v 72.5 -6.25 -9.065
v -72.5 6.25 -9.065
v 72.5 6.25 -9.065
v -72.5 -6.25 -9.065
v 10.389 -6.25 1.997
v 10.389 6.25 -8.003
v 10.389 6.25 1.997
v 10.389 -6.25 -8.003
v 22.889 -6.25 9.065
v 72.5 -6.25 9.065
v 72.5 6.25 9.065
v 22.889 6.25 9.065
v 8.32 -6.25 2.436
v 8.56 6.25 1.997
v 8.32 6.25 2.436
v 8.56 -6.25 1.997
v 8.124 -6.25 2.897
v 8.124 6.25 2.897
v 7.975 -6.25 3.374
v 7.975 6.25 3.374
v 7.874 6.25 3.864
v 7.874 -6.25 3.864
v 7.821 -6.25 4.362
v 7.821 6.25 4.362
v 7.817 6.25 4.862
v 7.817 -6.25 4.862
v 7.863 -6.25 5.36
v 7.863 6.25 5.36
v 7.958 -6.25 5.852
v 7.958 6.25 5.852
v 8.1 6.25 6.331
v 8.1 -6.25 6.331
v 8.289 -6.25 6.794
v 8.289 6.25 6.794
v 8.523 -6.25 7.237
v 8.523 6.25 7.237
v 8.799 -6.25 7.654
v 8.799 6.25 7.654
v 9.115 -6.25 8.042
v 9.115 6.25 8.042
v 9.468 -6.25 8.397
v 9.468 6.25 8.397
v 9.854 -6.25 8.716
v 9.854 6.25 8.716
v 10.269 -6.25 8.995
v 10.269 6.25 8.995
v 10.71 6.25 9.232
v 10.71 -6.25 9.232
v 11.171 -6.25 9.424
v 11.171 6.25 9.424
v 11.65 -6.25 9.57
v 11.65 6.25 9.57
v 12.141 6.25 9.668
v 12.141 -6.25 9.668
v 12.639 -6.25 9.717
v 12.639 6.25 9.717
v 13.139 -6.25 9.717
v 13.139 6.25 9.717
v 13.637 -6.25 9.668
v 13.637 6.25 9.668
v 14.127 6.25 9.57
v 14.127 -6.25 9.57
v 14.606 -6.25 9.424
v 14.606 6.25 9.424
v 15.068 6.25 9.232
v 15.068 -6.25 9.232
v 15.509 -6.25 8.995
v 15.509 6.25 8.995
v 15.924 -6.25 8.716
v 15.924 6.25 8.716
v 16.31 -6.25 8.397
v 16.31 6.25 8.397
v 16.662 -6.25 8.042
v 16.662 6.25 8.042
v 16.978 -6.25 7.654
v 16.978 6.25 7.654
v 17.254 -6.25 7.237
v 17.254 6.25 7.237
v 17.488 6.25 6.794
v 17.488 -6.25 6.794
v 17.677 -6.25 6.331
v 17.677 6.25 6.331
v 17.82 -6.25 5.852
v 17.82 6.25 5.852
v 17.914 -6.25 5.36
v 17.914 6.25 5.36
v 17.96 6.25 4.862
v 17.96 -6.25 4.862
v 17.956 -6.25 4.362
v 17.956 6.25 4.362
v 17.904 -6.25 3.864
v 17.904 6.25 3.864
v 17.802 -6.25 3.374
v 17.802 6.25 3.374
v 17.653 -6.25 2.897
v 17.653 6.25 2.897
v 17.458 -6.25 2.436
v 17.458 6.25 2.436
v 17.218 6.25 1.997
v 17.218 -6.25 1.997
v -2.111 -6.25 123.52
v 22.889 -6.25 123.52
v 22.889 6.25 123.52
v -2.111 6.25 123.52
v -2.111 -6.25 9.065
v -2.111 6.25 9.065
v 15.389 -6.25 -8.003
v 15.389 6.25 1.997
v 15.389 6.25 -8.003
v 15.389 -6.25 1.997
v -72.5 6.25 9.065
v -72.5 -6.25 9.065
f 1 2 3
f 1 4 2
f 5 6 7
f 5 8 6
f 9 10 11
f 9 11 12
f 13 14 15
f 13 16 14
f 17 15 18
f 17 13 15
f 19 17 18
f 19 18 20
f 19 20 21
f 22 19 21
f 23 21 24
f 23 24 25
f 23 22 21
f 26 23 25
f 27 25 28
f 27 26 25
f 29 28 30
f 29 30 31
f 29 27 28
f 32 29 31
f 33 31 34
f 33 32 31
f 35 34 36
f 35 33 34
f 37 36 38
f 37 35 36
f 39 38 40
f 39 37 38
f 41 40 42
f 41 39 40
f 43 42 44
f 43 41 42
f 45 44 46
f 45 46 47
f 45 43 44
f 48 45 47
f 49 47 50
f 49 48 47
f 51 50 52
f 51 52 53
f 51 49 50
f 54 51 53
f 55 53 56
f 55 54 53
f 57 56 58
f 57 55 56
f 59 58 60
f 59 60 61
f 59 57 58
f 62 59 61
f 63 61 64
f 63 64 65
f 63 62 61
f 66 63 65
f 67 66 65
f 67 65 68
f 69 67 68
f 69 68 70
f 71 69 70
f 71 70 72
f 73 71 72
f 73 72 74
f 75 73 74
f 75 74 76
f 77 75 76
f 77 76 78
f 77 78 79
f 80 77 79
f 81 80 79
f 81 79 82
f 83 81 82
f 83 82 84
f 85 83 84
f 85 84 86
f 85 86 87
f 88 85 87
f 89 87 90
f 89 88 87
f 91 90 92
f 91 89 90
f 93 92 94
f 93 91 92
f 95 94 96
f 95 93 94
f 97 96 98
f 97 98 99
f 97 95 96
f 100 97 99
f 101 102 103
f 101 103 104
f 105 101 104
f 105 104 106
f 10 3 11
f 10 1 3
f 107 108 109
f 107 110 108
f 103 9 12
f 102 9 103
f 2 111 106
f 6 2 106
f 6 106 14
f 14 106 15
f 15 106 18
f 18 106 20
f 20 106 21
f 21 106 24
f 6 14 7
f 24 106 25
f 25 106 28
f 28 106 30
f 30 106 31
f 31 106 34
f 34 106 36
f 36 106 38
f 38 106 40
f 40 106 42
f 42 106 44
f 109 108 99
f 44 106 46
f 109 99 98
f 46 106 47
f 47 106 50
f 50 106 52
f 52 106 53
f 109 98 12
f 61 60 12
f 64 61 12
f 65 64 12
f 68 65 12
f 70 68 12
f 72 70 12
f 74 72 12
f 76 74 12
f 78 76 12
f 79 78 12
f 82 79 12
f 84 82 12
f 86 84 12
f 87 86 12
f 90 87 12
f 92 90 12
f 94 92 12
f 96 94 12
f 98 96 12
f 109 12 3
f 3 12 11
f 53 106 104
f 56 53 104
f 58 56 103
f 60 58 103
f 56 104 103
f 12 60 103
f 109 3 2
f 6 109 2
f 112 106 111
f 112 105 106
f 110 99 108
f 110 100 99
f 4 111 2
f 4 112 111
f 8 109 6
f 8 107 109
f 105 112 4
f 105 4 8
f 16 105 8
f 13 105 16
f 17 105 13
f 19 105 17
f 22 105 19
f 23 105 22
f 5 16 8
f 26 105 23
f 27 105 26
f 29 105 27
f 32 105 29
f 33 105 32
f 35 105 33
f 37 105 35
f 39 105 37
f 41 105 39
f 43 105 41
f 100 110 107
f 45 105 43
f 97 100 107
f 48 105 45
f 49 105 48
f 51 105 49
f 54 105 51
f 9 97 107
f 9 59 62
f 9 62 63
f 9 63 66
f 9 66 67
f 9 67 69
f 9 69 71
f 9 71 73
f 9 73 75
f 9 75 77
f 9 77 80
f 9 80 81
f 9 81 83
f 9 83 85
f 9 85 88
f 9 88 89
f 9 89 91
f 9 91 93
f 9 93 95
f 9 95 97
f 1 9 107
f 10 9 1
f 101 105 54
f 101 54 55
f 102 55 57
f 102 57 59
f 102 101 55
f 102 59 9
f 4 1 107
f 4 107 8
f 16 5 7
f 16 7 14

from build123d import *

# Parameters (mm, degrees)
F1_DEPTH = 6.25


with BuildPart() as f1:
    # F0 (on Front) → F1 (new body, symmetric)
    with BuildSketch(Plane.XZ):
        Polygon((72.5, -9.064749), (72.5, 9.064749), (22.888701, 9.064749), (22.888701, 123.519985), (-2.111299, 123.519985), (-2.111299, 9.064749), (-72.5, 9.064749), (-72.5, -9.064749), align=None)
        with BuildLine():
            Line((10.388701, 1.997165), (8.559674, 1.997165))
            ThreePointArc((8.559674, 1.997165), (12.888701, 9.723112), (17.217728, 1.997165))
            Line((17.217728, 1.997165), (15.388701, 1.997165))
            Line((15.388701, 1.997165), (15.388701, -8.002835))
            Line((15.388701, -8.002835), (10.388701, -8.002835))
            Line((10.388701, -8.002835), (10.388701, 1.997165))
        make_face(mode=Mode.SUBTRACT)
    extrude(amount=F1_DEPTH, both=True)


solid = f1.part
